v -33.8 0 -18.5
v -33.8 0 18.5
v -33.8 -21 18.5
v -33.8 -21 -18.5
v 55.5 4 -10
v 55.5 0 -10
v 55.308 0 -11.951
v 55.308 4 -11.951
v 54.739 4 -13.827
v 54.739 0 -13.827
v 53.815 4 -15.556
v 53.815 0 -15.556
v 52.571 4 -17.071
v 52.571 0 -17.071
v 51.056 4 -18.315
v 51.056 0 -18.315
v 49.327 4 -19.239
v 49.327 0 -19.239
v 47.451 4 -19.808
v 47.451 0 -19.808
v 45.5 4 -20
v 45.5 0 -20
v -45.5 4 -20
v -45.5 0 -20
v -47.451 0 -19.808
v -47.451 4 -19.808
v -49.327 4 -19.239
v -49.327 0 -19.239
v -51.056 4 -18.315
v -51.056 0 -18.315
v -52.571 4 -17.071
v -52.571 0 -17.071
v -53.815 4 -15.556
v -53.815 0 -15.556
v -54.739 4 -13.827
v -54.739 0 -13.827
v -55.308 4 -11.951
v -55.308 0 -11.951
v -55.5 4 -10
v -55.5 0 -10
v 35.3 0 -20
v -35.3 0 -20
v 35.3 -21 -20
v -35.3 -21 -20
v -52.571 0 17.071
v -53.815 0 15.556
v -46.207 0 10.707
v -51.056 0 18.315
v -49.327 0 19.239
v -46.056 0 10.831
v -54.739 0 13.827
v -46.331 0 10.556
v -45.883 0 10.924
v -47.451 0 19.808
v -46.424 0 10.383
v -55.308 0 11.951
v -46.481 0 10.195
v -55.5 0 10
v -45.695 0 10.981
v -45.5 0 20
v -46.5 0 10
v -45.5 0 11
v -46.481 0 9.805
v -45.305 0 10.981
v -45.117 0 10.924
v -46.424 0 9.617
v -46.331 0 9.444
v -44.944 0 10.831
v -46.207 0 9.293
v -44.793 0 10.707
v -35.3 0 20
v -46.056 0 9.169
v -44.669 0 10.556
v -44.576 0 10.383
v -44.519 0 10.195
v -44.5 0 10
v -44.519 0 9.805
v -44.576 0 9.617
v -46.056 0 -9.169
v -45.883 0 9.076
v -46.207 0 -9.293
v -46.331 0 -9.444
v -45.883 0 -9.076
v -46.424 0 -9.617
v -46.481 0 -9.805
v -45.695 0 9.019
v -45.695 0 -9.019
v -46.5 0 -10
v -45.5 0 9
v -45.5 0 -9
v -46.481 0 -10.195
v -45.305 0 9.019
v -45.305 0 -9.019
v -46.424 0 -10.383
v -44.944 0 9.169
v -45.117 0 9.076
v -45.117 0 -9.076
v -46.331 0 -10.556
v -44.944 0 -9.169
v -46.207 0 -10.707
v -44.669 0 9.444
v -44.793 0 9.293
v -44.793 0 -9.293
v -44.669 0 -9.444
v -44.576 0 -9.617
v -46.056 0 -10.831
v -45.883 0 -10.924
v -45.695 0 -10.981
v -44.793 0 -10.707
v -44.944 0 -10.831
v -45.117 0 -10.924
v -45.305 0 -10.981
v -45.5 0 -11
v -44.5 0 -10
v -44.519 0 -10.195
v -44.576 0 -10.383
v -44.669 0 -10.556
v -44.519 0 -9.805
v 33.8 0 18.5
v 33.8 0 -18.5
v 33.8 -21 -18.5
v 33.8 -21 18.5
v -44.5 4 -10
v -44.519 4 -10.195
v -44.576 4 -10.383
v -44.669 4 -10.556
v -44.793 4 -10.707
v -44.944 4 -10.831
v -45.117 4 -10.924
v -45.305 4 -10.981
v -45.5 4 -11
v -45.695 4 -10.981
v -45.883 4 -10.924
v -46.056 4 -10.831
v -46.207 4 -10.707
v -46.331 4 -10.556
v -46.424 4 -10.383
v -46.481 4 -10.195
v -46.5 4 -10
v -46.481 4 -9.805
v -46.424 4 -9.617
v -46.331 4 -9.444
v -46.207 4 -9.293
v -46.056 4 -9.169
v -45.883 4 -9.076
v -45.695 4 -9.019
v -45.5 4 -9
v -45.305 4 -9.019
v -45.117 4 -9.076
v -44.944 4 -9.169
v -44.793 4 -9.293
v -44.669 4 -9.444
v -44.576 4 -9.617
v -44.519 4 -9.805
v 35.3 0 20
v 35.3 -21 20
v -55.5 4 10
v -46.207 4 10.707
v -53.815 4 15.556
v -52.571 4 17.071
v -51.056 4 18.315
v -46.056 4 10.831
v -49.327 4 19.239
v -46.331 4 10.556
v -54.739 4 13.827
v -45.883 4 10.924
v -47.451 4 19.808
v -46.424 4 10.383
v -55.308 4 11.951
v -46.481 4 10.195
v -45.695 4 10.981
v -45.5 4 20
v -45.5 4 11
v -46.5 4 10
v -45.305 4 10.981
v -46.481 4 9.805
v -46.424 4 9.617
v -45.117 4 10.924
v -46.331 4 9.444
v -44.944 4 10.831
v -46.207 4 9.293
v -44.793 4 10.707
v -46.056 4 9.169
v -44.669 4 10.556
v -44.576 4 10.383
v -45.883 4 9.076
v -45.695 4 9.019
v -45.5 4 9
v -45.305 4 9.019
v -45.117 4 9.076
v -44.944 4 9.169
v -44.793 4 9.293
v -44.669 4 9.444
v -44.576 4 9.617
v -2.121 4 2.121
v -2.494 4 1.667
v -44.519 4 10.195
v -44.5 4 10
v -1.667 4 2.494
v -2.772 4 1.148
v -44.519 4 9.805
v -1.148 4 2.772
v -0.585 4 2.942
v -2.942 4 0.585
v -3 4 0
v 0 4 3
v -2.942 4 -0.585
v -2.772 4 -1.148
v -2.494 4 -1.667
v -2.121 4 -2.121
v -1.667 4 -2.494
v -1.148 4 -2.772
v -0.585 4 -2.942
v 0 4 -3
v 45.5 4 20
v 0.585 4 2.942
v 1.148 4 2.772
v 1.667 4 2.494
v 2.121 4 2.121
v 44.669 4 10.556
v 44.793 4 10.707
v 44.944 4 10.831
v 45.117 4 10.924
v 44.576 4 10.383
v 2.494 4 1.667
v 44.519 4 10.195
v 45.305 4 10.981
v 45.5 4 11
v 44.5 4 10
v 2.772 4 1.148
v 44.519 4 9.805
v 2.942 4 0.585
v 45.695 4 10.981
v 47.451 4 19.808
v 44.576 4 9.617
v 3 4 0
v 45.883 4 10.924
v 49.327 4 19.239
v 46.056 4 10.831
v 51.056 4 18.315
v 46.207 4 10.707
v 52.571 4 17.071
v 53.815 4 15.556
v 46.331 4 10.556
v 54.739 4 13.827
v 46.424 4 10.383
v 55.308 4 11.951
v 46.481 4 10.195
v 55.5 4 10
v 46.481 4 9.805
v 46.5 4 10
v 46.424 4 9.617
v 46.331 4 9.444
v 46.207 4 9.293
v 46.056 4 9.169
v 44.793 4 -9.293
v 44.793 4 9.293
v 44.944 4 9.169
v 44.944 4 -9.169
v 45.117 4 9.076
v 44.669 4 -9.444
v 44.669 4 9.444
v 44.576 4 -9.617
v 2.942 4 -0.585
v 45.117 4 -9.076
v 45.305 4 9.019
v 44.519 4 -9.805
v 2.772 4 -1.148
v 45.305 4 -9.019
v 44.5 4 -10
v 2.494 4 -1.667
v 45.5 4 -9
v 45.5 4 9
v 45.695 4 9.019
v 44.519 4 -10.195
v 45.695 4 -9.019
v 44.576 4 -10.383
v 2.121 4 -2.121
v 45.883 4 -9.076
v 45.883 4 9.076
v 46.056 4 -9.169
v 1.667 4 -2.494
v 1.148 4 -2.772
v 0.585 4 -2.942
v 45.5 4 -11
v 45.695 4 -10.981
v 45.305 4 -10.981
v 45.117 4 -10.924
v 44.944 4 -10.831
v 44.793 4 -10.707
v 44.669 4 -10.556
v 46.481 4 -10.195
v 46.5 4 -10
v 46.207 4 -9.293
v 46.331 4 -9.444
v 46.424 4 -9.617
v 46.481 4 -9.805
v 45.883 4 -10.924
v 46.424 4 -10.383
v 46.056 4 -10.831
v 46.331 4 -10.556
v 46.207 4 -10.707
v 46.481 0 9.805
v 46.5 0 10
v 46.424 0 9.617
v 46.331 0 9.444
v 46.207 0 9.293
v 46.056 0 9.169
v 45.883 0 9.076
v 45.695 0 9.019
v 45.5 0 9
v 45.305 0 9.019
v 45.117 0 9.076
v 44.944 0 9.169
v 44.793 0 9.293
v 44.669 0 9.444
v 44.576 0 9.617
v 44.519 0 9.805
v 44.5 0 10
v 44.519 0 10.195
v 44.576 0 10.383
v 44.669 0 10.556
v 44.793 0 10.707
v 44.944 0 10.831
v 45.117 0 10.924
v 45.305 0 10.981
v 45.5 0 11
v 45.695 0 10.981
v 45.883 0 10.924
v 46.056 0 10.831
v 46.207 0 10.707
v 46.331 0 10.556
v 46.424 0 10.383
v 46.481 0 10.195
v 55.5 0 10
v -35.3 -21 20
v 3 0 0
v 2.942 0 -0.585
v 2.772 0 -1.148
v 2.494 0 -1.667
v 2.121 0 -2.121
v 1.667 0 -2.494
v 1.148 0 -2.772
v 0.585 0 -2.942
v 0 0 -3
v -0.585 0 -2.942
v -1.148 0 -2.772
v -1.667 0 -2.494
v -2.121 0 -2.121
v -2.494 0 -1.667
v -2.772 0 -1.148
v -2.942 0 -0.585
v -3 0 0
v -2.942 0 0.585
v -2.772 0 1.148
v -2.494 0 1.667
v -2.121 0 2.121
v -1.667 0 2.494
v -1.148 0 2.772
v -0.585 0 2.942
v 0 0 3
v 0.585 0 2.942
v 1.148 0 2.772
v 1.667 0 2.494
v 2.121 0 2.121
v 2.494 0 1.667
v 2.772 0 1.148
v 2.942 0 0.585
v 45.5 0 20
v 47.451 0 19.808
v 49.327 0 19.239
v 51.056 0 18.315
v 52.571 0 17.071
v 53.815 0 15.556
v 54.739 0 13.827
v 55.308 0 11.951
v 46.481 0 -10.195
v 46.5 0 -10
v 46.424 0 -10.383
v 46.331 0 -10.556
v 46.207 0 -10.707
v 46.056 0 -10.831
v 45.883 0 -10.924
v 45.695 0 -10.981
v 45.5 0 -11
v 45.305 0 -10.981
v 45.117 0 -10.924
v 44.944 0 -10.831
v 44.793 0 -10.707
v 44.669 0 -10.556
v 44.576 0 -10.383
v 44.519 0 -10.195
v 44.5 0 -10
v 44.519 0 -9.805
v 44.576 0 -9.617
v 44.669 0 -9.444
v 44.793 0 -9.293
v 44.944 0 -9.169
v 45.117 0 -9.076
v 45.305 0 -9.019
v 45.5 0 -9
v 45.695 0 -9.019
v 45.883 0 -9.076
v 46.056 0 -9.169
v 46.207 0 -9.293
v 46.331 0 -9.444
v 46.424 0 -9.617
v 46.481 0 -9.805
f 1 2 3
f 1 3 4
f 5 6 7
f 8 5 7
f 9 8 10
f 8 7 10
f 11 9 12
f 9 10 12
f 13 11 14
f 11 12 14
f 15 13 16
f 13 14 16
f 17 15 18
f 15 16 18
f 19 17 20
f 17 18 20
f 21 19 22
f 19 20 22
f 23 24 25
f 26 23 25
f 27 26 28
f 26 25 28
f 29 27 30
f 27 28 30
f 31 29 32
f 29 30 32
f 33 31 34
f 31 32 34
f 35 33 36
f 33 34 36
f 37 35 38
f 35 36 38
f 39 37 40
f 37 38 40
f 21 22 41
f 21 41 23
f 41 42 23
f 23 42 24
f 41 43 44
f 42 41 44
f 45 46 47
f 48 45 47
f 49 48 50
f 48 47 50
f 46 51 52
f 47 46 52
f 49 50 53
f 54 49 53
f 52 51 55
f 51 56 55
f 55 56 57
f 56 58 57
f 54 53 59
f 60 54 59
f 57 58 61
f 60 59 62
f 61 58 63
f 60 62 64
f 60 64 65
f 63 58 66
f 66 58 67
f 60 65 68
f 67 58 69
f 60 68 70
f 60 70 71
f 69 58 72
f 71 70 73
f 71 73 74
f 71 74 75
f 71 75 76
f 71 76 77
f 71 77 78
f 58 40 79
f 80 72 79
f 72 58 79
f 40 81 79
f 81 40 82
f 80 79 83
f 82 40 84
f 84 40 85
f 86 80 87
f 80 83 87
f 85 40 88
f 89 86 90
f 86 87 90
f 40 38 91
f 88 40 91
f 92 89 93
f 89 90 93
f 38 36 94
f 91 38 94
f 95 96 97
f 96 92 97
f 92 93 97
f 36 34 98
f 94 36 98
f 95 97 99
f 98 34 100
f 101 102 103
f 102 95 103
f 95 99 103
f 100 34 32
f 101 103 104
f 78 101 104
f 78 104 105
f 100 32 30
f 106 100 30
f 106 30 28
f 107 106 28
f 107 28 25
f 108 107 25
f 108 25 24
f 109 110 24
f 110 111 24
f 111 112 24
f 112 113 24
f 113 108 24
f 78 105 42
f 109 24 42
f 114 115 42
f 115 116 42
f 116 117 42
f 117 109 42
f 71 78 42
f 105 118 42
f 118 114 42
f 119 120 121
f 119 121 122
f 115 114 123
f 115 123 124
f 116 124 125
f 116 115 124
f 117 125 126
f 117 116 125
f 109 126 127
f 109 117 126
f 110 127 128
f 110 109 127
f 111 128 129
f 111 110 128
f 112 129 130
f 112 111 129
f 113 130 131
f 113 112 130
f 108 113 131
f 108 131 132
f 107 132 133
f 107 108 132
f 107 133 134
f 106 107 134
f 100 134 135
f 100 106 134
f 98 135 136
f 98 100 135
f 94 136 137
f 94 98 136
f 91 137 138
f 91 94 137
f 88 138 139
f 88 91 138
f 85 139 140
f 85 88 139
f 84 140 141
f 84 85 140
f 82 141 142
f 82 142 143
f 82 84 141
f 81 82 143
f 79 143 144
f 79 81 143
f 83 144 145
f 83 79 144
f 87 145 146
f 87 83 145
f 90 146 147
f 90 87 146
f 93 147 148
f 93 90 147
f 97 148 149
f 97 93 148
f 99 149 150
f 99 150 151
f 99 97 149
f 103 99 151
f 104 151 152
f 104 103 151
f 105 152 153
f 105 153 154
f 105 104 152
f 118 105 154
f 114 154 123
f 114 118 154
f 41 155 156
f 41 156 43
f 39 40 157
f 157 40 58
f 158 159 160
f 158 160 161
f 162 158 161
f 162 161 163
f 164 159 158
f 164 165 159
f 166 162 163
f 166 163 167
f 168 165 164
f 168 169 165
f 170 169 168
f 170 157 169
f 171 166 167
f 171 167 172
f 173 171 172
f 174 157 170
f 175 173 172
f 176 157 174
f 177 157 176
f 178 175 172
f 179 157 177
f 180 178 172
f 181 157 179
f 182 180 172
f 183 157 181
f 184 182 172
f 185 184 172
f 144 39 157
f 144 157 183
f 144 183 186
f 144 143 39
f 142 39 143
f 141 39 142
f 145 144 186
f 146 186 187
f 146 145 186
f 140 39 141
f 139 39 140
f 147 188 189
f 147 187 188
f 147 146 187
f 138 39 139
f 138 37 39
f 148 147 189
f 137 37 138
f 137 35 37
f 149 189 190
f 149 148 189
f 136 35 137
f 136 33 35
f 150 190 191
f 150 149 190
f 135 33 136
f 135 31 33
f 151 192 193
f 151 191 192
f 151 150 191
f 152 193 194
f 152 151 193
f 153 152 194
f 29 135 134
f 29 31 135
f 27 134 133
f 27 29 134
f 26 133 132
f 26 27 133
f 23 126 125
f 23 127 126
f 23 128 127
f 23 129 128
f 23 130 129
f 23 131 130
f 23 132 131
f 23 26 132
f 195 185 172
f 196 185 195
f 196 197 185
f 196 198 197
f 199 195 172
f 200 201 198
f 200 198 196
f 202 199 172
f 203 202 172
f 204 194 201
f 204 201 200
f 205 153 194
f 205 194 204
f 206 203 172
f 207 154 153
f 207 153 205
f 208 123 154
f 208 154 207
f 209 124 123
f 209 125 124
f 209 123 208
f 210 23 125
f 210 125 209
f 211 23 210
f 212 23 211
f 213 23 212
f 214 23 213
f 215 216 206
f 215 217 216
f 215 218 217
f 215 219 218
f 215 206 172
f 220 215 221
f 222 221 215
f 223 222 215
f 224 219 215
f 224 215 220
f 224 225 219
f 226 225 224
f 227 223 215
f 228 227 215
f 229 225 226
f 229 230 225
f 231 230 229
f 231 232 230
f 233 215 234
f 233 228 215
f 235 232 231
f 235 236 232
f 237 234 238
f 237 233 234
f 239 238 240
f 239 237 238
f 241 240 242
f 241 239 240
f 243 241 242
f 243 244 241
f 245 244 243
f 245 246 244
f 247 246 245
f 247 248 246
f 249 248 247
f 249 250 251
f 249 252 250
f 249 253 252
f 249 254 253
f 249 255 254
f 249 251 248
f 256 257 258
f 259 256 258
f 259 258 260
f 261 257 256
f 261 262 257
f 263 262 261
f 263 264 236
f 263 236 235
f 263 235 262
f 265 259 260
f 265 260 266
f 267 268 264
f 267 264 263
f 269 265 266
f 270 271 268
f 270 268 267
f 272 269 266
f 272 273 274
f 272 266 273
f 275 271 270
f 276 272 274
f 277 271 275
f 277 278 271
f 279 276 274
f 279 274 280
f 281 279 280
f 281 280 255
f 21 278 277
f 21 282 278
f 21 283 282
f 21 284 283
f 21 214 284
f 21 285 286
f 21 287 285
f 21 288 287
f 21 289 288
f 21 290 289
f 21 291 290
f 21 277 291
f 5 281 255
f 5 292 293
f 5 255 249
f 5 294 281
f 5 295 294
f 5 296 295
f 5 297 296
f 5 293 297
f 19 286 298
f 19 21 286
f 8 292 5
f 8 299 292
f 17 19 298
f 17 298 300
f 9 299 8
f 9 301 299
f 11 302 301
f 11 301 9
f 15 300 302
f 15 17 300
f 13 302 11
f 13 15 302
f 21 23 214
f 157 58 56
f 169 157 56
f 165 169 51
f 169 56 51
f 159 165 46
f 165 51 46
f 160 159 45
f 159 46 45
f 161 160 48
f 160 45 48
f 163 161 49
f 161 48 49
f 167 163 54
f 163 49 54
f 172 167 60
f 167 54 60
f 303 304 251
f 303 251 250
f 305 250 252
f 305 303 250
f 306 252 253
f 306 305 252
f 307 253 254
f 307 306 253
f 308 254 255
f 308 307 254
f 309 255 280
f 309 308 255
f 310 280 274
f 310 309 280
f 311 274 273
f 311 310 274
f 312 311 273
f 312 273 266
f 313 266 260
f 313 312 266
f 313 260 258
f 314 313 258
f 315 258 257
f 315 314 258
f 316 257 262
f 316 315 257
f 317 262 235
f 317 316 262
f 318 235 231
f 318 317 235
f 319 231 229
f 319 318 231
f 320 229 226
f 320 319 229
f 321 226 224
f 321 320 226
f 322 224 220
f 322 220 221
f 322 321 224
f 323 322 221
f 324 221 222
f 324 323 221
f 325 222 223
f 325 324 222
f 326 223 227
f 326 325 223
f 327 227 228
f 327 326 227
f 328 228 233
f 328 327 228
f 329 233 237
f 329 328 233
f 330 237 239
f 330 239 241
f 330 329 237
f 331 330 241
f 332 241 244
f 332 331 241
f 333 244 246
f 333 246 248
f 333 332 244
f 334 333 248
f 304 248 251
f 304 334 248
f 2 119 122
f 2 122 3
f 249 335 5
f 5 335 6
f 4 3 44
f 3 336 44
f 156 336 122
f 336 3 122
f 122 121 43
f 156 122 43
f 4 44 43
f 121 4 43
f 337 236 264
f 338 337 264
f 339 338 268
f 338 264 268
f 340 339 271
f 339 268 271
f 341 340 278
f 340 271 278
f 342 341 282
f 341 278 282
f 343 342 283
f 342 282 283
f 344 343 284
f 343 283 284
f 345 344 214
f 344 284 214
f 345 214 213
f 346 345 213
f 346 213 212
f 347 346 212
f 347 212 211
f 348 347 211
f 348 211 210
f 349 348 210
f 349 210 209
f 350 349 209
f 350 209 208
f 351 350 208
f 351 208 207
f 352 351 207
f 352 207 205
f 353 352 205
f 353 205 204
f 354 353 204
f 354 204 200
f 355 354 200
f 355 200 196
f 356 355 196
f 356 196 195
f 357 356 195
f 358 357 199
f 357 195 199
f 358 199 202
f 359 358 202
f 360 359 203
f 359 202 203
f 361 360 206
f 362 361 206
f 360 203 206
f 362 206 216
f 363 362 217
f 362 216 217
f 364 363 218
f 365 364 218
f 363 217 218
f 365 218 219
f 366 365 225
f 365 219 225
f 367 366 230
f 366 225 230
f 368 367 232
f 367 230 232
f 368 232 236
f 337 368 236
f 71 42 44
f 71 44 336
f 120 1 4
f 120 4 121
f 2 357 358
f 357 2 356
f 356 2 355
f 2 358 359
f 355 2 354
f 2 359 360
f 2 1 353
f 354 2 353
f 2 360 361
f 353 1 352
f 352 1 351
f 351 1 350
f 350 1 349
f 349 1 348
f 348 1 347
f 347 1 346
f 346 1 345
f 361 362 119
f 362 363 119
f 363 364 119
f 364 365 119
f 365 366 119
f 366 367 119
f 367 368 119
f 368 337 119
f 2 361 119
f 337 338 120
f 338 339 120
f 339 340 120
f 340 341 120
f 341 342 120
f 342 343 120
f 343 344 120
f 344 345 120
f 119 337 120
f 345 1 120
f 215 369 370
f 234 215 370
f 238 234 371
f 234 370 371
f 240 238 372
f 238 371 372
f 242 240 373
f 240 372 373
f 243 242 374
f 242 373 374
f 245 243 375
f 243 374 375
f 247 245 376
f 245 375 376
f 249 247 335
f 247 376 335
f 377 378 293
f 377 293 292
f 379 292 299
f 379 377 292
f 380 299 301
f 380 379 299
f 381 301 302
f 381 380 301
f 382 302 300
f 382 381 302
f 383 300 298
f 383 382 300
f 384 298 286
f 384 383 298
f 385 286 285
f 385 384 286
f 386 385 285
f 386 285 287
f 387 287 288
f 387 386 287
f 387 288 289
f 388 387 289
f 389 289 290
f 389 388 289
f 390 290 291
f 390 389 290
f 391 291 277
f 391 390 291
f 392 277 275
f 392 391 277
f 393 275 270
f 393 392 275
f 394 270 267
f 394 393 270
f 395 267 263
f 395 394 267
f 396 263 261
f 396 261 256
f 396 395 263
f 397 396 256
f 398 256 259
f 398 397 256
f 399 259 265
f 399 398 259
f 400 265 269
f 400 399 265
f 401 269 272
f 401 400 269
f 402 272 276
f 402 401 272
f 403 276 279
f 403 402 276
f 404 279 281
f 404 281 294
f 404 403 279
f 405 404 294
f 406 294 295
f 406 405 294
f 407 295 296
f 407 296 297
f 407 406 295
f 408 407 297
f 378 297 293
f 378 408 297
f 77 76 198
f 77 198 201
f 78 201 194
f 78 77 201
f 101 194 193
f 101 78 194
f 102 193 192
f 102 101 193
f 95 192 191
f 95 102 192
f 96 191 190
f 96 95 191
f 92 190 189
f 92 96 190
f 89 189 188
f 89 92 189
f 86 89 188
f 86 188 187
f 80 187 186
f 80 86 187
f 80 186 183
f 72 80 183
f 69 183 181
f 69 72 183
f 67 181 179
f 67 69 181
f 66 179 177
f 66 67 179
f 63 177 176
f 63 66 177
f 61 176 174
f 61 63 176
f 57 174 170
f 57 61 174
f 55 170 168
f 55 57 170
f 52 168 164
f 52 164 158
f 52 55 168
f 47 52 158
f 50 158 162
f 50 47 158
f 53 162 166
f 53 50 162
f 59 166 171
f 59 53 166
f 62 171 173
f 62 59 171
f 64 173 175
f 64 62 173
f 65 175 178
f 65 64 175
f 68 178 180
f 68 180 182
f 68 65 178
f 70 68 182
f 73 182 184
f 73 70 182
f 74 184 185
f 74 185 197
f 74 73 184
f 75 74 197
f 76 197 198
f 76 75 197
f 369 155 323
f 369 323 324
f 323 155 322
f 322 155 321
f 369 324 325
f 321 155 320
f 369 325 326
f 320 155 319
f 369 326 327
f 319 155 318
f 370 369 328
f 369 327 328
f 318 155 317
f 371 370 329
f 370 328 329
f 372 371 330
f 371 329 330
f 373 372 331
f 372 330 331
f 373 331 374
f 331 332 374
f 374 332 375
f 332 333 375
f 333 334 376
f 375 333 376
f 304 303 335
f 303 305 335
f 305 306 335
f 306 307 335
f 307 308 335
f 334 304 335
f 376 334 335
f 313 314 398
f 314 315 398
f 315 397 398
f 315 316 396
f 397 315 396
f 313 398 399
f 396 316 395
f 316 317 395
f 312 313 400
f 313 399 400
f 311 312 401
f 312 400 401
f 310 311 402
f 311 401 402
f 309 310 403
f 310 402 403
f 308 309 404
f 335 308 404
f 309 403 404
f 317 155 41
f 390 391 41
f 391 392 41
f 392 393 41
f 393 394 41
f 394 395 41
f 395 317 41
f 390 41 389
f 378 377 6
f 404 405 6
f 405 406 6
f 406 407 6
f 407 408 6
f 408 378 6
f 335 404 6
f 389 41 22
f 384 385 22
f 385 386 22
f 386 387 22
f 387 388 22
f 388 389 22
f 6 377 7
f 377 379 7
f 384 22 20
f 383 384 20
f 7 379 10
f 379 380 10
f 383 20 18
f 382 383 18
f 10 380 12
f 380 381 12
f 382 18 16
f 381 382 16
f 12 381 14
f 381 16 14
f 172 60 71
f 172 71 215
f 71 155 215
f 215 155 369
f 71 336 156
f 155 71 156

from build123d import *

# Parameters (mm, degrees)
SKETCH1_R           = 1
BOSS_EXTRUDE1_DEPTH = 4
BOSS_EXTRUDE3_DEPTH = 25
SKETCH3_R           = 3
CUT_EXTRUDE1_DEPTH  = 20


with BuildPart() as part:
    # Sketch1 → Boss-Extrude1 (new body)
    with BuildSketch(Plane(origin=(0, 0, 0), x_dir=(1, 0, 0), z_dir=(0, 1, 0))):
        with BuildLine():
            Line((-35.5, 20), (-35.5, 0))
            Line((-35.5, 0), (-35.5, -20))
            Line((-35.5, -20), (45.5, -20))
            ThreePointArc((45.5, -20), (52.571067812, -17.071067812), (55.5, -10))
            Line((55.5, -10), (55.5, 10))
            ThreePointArc((55.5, 10), (52.571067812, 17.071067812), (45.5, 20))
            Line((45.5, 20), (-35.5, 20))
        make_face()
        with Locations((45.5, -10)):
            Circle(SKETCH1_R, mode=Mode.SUBTRACT)
        Circle(SKETCH1_R, mode=Mode.SUBTRACT)
        with Locations((45.5, 10)):
            Circle(SKETCH1_R, mode=Mode.SUBTRACT)
        with BuildLine():
            Line((-35.5, -20), (-35.5, 0))
            Line((-35.5, 0), (-35.5, 20))
            Line((-35.5, 20), (-45.5, 20))
            ThreePointArc((-45.5, 20), (-52.571067812, 17.071067812), (-55.5, 10))
            Line((-55.5, 10), (-55.5, 0))
            Line((-55.5, 0), (-55.5, -10))
            ThreePointArc((-55.5, -10), (-52.571067812, -17.071067812), (-45.5, -20))
            Line((-45.5, -20), (-35.5, -20))
        make_face()
        with Locations((-45.5, -10)):
            Circle(SKETCH1_R, mode=Mode.SUBTRACT)
        with Locations((-45.5, 10)):
            Circle(SKETCH1_R, mode=Mode.SUBTRACT)
    extrude(amount=BOSS_EXTRUDE1_DEPTH)

    # Sketch2 → Boss-Extrude3 (add)
    with BuildSketch(Plane(origin=(0, 4, 0), x_dir=(1, 0, 0), z_dir=(0, 1, 0))):
        Polygon((-35.3, 0), (-35.3, -20), (35.3, -20), (35.3, 0), (35.3, 20), (-35.3, 20), align=None)
        Polygon((33.8, -18.5), (-33.8, -18.5), (-33.8, 0), (-33.8, 18.5), (33.8, 18.5), (33.8, 0), align=None, mode=Mode.SUBTRACT)
    extrude(amount=-BOSS_EXTRUDE3_DEPTH)

    # Sketch3 → Cut-Extrude1 (cut)
    with BuildSketch(Plane(origin=(0, 4, 0), x_dir=(1, 0, 0), z_dir=(0, 1, 0))):
        Circle(SKETCH3_R)
    extrude(amount=-CUT_EXTRUDE1_DEPTH, mode=Mode.SUBTRACT)


solid = part.part
